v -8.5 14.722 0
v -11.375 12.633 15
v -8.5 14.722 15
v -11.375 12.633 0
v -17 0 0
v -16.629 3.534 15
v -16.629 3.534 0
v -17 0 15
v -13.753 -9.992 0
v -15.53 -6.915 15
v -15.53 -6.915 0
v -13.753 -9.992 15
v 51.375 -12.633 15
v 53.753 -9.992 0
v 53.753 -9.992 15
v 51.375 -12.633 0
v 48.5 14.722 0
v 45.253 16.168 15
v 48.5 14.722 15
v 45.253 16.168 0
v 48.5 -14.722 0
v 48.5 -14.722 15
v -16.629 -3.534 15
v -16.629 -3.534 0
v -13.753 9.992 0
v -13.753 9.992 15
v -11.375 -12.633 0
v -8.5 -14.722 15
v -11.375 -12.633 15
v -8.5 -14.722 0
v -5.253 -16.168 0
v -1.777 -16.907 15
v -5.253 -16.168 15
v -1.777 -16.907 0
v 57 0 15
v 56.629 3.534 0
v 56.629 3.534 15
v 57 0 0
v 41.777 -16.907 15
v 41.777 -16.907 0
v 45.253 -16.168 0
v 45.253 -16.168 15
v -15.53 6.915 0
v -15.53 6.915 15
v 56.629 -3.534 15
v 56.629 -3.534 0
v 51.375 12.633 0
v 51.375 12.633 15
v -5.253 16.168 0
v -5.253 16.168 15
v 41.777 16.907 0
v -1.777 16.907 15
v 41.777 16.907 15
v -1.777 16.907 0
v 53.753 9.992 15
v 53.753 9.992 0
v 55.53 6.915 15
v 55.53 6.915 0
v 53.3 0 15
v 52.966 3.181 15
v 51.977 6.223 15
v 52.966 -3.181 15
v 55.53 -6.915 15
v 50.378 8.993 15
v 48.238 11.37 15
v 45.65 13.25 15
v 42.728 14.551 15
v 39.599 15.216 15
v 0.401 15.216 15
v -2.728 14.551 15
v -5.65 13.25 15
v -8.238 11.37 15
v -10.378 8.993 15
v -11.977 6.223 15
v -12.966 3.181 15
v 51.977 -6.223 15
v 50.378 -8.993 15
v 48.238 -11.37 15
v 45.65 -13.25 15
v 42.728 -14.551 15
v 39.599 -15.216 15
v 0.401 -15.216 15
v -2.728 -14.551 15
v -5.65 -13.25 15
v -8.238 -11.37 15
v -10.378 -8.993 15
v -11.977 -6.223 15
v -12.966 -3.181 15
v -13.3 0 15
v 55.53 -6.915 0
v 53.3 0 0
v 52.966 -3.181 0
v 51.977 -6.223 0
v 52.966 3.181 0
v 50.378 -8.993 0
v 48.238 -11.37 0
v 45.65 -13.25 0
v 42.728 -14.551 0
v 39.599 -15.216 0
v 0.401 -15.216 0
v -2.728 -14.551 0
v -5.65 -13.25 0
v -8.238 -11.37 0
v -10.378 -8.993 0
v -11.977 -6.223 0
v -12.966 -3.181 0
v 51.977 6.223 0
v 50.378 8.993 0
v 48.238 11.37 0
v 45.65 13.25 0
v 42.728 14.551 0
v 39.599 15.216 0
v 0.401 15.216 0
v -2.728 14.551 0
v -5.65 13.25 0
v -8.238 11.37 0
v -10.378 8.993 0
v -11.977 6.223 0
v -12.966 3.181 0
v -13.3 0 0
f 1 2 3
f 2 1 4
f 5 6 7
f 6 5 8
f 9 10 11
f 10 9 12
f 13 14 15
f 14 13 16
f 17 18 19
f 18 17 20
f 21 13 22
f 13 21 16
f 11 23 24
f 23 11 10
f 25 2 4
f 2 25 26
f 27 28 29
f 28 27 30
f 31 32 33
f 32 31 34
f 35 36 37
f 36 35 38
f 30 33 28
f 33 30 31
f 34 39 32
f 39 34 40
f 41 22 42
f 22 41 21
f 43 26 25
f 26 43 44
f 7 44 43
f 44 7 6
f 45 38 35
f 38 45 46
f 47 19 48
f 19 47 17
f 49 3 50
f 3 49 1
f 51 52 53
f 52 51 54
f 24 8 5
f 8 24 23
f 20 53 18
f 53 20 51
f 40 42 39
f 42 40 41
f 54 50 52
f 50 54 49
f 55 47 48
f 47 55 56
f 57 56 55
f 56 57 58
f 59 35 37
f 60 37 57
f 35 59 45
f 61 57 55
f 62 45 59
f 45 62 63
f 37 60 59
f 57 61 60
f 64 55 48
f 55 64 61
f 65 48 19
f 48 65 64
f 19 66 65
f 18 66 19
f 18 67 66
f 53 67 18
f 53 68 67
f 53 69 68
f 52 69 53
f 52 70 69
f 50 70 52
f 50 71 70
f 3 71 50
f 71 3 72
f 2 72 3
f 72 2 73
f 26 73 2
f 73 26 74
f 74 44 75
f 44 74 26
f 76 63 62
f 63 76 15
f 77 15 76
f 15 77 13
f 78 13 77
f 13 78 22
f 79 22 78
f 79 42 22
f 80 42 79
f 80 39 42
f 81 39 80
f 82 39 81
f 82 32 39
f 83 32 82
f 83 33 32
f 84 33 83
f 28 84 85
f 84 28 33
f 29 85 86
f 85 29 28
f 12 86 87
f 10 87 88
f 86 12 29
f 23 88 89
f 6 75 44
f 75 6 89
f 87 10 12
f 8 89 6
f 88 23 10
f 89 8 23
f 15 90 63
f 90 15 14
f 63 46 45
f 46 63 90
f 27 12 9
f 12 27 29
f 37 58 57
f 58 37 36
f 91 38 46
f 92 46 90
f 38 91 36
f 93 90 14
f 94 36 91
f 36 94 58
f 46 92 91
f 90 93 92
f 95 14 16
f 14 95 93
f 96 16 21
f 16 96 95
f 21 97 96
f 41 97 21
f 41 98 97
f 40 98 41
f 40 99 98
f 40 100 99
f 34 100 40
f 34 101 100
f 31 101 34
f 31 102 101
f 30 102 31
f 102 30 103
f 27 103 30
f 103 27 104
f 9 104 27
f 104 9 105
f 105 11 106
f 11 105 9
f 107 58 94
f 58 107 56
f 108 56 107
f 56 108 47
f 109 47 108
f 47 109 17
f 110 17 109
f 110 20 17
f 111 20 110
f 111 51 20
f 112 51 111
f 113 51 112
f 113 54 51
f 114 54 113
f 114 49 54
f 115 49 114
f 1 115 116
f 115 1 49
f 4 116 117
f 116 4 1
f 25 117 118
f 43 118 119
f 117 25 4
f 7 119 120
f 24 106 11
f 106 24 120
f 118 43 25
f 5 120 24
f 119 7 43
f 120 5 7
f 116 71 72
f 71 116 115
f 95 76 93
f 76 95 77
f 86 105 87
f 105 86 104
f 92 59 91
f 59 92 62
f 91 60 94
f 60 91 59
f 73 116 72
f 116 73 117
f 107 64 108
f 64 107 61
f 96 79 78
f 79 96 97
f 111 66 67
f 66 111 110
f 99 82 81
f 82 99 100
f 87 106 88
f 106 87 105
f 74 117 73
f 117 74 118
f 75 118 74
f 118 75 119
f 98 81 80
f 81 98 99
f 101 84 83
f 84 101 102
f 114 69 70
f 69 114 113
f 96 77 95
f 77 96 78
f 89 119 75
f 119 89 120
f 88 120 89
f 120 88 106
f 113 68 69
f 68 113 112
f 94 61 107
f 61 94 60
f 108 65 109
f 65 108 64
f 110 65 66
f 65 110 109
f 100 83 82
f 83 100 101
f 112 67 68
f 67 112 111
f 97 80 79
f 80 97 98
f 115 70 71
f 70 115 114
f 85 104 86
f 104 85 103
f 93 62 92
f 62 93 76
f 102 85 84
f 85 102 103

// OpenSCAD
jheight = 15;
jradius = 17;

module topplug(){
  hull(){
    translate([40, 0, 0]){
      cylinder(jheight, jradius, jradius);
    }
    cylinder(jheight, jradius, jradius);
  }
}

difference(){
  topplug();
  translate([2, 0, 0]){
    scale([0.9, 0.9, 1]){
      topplug();
    }
  }
}
